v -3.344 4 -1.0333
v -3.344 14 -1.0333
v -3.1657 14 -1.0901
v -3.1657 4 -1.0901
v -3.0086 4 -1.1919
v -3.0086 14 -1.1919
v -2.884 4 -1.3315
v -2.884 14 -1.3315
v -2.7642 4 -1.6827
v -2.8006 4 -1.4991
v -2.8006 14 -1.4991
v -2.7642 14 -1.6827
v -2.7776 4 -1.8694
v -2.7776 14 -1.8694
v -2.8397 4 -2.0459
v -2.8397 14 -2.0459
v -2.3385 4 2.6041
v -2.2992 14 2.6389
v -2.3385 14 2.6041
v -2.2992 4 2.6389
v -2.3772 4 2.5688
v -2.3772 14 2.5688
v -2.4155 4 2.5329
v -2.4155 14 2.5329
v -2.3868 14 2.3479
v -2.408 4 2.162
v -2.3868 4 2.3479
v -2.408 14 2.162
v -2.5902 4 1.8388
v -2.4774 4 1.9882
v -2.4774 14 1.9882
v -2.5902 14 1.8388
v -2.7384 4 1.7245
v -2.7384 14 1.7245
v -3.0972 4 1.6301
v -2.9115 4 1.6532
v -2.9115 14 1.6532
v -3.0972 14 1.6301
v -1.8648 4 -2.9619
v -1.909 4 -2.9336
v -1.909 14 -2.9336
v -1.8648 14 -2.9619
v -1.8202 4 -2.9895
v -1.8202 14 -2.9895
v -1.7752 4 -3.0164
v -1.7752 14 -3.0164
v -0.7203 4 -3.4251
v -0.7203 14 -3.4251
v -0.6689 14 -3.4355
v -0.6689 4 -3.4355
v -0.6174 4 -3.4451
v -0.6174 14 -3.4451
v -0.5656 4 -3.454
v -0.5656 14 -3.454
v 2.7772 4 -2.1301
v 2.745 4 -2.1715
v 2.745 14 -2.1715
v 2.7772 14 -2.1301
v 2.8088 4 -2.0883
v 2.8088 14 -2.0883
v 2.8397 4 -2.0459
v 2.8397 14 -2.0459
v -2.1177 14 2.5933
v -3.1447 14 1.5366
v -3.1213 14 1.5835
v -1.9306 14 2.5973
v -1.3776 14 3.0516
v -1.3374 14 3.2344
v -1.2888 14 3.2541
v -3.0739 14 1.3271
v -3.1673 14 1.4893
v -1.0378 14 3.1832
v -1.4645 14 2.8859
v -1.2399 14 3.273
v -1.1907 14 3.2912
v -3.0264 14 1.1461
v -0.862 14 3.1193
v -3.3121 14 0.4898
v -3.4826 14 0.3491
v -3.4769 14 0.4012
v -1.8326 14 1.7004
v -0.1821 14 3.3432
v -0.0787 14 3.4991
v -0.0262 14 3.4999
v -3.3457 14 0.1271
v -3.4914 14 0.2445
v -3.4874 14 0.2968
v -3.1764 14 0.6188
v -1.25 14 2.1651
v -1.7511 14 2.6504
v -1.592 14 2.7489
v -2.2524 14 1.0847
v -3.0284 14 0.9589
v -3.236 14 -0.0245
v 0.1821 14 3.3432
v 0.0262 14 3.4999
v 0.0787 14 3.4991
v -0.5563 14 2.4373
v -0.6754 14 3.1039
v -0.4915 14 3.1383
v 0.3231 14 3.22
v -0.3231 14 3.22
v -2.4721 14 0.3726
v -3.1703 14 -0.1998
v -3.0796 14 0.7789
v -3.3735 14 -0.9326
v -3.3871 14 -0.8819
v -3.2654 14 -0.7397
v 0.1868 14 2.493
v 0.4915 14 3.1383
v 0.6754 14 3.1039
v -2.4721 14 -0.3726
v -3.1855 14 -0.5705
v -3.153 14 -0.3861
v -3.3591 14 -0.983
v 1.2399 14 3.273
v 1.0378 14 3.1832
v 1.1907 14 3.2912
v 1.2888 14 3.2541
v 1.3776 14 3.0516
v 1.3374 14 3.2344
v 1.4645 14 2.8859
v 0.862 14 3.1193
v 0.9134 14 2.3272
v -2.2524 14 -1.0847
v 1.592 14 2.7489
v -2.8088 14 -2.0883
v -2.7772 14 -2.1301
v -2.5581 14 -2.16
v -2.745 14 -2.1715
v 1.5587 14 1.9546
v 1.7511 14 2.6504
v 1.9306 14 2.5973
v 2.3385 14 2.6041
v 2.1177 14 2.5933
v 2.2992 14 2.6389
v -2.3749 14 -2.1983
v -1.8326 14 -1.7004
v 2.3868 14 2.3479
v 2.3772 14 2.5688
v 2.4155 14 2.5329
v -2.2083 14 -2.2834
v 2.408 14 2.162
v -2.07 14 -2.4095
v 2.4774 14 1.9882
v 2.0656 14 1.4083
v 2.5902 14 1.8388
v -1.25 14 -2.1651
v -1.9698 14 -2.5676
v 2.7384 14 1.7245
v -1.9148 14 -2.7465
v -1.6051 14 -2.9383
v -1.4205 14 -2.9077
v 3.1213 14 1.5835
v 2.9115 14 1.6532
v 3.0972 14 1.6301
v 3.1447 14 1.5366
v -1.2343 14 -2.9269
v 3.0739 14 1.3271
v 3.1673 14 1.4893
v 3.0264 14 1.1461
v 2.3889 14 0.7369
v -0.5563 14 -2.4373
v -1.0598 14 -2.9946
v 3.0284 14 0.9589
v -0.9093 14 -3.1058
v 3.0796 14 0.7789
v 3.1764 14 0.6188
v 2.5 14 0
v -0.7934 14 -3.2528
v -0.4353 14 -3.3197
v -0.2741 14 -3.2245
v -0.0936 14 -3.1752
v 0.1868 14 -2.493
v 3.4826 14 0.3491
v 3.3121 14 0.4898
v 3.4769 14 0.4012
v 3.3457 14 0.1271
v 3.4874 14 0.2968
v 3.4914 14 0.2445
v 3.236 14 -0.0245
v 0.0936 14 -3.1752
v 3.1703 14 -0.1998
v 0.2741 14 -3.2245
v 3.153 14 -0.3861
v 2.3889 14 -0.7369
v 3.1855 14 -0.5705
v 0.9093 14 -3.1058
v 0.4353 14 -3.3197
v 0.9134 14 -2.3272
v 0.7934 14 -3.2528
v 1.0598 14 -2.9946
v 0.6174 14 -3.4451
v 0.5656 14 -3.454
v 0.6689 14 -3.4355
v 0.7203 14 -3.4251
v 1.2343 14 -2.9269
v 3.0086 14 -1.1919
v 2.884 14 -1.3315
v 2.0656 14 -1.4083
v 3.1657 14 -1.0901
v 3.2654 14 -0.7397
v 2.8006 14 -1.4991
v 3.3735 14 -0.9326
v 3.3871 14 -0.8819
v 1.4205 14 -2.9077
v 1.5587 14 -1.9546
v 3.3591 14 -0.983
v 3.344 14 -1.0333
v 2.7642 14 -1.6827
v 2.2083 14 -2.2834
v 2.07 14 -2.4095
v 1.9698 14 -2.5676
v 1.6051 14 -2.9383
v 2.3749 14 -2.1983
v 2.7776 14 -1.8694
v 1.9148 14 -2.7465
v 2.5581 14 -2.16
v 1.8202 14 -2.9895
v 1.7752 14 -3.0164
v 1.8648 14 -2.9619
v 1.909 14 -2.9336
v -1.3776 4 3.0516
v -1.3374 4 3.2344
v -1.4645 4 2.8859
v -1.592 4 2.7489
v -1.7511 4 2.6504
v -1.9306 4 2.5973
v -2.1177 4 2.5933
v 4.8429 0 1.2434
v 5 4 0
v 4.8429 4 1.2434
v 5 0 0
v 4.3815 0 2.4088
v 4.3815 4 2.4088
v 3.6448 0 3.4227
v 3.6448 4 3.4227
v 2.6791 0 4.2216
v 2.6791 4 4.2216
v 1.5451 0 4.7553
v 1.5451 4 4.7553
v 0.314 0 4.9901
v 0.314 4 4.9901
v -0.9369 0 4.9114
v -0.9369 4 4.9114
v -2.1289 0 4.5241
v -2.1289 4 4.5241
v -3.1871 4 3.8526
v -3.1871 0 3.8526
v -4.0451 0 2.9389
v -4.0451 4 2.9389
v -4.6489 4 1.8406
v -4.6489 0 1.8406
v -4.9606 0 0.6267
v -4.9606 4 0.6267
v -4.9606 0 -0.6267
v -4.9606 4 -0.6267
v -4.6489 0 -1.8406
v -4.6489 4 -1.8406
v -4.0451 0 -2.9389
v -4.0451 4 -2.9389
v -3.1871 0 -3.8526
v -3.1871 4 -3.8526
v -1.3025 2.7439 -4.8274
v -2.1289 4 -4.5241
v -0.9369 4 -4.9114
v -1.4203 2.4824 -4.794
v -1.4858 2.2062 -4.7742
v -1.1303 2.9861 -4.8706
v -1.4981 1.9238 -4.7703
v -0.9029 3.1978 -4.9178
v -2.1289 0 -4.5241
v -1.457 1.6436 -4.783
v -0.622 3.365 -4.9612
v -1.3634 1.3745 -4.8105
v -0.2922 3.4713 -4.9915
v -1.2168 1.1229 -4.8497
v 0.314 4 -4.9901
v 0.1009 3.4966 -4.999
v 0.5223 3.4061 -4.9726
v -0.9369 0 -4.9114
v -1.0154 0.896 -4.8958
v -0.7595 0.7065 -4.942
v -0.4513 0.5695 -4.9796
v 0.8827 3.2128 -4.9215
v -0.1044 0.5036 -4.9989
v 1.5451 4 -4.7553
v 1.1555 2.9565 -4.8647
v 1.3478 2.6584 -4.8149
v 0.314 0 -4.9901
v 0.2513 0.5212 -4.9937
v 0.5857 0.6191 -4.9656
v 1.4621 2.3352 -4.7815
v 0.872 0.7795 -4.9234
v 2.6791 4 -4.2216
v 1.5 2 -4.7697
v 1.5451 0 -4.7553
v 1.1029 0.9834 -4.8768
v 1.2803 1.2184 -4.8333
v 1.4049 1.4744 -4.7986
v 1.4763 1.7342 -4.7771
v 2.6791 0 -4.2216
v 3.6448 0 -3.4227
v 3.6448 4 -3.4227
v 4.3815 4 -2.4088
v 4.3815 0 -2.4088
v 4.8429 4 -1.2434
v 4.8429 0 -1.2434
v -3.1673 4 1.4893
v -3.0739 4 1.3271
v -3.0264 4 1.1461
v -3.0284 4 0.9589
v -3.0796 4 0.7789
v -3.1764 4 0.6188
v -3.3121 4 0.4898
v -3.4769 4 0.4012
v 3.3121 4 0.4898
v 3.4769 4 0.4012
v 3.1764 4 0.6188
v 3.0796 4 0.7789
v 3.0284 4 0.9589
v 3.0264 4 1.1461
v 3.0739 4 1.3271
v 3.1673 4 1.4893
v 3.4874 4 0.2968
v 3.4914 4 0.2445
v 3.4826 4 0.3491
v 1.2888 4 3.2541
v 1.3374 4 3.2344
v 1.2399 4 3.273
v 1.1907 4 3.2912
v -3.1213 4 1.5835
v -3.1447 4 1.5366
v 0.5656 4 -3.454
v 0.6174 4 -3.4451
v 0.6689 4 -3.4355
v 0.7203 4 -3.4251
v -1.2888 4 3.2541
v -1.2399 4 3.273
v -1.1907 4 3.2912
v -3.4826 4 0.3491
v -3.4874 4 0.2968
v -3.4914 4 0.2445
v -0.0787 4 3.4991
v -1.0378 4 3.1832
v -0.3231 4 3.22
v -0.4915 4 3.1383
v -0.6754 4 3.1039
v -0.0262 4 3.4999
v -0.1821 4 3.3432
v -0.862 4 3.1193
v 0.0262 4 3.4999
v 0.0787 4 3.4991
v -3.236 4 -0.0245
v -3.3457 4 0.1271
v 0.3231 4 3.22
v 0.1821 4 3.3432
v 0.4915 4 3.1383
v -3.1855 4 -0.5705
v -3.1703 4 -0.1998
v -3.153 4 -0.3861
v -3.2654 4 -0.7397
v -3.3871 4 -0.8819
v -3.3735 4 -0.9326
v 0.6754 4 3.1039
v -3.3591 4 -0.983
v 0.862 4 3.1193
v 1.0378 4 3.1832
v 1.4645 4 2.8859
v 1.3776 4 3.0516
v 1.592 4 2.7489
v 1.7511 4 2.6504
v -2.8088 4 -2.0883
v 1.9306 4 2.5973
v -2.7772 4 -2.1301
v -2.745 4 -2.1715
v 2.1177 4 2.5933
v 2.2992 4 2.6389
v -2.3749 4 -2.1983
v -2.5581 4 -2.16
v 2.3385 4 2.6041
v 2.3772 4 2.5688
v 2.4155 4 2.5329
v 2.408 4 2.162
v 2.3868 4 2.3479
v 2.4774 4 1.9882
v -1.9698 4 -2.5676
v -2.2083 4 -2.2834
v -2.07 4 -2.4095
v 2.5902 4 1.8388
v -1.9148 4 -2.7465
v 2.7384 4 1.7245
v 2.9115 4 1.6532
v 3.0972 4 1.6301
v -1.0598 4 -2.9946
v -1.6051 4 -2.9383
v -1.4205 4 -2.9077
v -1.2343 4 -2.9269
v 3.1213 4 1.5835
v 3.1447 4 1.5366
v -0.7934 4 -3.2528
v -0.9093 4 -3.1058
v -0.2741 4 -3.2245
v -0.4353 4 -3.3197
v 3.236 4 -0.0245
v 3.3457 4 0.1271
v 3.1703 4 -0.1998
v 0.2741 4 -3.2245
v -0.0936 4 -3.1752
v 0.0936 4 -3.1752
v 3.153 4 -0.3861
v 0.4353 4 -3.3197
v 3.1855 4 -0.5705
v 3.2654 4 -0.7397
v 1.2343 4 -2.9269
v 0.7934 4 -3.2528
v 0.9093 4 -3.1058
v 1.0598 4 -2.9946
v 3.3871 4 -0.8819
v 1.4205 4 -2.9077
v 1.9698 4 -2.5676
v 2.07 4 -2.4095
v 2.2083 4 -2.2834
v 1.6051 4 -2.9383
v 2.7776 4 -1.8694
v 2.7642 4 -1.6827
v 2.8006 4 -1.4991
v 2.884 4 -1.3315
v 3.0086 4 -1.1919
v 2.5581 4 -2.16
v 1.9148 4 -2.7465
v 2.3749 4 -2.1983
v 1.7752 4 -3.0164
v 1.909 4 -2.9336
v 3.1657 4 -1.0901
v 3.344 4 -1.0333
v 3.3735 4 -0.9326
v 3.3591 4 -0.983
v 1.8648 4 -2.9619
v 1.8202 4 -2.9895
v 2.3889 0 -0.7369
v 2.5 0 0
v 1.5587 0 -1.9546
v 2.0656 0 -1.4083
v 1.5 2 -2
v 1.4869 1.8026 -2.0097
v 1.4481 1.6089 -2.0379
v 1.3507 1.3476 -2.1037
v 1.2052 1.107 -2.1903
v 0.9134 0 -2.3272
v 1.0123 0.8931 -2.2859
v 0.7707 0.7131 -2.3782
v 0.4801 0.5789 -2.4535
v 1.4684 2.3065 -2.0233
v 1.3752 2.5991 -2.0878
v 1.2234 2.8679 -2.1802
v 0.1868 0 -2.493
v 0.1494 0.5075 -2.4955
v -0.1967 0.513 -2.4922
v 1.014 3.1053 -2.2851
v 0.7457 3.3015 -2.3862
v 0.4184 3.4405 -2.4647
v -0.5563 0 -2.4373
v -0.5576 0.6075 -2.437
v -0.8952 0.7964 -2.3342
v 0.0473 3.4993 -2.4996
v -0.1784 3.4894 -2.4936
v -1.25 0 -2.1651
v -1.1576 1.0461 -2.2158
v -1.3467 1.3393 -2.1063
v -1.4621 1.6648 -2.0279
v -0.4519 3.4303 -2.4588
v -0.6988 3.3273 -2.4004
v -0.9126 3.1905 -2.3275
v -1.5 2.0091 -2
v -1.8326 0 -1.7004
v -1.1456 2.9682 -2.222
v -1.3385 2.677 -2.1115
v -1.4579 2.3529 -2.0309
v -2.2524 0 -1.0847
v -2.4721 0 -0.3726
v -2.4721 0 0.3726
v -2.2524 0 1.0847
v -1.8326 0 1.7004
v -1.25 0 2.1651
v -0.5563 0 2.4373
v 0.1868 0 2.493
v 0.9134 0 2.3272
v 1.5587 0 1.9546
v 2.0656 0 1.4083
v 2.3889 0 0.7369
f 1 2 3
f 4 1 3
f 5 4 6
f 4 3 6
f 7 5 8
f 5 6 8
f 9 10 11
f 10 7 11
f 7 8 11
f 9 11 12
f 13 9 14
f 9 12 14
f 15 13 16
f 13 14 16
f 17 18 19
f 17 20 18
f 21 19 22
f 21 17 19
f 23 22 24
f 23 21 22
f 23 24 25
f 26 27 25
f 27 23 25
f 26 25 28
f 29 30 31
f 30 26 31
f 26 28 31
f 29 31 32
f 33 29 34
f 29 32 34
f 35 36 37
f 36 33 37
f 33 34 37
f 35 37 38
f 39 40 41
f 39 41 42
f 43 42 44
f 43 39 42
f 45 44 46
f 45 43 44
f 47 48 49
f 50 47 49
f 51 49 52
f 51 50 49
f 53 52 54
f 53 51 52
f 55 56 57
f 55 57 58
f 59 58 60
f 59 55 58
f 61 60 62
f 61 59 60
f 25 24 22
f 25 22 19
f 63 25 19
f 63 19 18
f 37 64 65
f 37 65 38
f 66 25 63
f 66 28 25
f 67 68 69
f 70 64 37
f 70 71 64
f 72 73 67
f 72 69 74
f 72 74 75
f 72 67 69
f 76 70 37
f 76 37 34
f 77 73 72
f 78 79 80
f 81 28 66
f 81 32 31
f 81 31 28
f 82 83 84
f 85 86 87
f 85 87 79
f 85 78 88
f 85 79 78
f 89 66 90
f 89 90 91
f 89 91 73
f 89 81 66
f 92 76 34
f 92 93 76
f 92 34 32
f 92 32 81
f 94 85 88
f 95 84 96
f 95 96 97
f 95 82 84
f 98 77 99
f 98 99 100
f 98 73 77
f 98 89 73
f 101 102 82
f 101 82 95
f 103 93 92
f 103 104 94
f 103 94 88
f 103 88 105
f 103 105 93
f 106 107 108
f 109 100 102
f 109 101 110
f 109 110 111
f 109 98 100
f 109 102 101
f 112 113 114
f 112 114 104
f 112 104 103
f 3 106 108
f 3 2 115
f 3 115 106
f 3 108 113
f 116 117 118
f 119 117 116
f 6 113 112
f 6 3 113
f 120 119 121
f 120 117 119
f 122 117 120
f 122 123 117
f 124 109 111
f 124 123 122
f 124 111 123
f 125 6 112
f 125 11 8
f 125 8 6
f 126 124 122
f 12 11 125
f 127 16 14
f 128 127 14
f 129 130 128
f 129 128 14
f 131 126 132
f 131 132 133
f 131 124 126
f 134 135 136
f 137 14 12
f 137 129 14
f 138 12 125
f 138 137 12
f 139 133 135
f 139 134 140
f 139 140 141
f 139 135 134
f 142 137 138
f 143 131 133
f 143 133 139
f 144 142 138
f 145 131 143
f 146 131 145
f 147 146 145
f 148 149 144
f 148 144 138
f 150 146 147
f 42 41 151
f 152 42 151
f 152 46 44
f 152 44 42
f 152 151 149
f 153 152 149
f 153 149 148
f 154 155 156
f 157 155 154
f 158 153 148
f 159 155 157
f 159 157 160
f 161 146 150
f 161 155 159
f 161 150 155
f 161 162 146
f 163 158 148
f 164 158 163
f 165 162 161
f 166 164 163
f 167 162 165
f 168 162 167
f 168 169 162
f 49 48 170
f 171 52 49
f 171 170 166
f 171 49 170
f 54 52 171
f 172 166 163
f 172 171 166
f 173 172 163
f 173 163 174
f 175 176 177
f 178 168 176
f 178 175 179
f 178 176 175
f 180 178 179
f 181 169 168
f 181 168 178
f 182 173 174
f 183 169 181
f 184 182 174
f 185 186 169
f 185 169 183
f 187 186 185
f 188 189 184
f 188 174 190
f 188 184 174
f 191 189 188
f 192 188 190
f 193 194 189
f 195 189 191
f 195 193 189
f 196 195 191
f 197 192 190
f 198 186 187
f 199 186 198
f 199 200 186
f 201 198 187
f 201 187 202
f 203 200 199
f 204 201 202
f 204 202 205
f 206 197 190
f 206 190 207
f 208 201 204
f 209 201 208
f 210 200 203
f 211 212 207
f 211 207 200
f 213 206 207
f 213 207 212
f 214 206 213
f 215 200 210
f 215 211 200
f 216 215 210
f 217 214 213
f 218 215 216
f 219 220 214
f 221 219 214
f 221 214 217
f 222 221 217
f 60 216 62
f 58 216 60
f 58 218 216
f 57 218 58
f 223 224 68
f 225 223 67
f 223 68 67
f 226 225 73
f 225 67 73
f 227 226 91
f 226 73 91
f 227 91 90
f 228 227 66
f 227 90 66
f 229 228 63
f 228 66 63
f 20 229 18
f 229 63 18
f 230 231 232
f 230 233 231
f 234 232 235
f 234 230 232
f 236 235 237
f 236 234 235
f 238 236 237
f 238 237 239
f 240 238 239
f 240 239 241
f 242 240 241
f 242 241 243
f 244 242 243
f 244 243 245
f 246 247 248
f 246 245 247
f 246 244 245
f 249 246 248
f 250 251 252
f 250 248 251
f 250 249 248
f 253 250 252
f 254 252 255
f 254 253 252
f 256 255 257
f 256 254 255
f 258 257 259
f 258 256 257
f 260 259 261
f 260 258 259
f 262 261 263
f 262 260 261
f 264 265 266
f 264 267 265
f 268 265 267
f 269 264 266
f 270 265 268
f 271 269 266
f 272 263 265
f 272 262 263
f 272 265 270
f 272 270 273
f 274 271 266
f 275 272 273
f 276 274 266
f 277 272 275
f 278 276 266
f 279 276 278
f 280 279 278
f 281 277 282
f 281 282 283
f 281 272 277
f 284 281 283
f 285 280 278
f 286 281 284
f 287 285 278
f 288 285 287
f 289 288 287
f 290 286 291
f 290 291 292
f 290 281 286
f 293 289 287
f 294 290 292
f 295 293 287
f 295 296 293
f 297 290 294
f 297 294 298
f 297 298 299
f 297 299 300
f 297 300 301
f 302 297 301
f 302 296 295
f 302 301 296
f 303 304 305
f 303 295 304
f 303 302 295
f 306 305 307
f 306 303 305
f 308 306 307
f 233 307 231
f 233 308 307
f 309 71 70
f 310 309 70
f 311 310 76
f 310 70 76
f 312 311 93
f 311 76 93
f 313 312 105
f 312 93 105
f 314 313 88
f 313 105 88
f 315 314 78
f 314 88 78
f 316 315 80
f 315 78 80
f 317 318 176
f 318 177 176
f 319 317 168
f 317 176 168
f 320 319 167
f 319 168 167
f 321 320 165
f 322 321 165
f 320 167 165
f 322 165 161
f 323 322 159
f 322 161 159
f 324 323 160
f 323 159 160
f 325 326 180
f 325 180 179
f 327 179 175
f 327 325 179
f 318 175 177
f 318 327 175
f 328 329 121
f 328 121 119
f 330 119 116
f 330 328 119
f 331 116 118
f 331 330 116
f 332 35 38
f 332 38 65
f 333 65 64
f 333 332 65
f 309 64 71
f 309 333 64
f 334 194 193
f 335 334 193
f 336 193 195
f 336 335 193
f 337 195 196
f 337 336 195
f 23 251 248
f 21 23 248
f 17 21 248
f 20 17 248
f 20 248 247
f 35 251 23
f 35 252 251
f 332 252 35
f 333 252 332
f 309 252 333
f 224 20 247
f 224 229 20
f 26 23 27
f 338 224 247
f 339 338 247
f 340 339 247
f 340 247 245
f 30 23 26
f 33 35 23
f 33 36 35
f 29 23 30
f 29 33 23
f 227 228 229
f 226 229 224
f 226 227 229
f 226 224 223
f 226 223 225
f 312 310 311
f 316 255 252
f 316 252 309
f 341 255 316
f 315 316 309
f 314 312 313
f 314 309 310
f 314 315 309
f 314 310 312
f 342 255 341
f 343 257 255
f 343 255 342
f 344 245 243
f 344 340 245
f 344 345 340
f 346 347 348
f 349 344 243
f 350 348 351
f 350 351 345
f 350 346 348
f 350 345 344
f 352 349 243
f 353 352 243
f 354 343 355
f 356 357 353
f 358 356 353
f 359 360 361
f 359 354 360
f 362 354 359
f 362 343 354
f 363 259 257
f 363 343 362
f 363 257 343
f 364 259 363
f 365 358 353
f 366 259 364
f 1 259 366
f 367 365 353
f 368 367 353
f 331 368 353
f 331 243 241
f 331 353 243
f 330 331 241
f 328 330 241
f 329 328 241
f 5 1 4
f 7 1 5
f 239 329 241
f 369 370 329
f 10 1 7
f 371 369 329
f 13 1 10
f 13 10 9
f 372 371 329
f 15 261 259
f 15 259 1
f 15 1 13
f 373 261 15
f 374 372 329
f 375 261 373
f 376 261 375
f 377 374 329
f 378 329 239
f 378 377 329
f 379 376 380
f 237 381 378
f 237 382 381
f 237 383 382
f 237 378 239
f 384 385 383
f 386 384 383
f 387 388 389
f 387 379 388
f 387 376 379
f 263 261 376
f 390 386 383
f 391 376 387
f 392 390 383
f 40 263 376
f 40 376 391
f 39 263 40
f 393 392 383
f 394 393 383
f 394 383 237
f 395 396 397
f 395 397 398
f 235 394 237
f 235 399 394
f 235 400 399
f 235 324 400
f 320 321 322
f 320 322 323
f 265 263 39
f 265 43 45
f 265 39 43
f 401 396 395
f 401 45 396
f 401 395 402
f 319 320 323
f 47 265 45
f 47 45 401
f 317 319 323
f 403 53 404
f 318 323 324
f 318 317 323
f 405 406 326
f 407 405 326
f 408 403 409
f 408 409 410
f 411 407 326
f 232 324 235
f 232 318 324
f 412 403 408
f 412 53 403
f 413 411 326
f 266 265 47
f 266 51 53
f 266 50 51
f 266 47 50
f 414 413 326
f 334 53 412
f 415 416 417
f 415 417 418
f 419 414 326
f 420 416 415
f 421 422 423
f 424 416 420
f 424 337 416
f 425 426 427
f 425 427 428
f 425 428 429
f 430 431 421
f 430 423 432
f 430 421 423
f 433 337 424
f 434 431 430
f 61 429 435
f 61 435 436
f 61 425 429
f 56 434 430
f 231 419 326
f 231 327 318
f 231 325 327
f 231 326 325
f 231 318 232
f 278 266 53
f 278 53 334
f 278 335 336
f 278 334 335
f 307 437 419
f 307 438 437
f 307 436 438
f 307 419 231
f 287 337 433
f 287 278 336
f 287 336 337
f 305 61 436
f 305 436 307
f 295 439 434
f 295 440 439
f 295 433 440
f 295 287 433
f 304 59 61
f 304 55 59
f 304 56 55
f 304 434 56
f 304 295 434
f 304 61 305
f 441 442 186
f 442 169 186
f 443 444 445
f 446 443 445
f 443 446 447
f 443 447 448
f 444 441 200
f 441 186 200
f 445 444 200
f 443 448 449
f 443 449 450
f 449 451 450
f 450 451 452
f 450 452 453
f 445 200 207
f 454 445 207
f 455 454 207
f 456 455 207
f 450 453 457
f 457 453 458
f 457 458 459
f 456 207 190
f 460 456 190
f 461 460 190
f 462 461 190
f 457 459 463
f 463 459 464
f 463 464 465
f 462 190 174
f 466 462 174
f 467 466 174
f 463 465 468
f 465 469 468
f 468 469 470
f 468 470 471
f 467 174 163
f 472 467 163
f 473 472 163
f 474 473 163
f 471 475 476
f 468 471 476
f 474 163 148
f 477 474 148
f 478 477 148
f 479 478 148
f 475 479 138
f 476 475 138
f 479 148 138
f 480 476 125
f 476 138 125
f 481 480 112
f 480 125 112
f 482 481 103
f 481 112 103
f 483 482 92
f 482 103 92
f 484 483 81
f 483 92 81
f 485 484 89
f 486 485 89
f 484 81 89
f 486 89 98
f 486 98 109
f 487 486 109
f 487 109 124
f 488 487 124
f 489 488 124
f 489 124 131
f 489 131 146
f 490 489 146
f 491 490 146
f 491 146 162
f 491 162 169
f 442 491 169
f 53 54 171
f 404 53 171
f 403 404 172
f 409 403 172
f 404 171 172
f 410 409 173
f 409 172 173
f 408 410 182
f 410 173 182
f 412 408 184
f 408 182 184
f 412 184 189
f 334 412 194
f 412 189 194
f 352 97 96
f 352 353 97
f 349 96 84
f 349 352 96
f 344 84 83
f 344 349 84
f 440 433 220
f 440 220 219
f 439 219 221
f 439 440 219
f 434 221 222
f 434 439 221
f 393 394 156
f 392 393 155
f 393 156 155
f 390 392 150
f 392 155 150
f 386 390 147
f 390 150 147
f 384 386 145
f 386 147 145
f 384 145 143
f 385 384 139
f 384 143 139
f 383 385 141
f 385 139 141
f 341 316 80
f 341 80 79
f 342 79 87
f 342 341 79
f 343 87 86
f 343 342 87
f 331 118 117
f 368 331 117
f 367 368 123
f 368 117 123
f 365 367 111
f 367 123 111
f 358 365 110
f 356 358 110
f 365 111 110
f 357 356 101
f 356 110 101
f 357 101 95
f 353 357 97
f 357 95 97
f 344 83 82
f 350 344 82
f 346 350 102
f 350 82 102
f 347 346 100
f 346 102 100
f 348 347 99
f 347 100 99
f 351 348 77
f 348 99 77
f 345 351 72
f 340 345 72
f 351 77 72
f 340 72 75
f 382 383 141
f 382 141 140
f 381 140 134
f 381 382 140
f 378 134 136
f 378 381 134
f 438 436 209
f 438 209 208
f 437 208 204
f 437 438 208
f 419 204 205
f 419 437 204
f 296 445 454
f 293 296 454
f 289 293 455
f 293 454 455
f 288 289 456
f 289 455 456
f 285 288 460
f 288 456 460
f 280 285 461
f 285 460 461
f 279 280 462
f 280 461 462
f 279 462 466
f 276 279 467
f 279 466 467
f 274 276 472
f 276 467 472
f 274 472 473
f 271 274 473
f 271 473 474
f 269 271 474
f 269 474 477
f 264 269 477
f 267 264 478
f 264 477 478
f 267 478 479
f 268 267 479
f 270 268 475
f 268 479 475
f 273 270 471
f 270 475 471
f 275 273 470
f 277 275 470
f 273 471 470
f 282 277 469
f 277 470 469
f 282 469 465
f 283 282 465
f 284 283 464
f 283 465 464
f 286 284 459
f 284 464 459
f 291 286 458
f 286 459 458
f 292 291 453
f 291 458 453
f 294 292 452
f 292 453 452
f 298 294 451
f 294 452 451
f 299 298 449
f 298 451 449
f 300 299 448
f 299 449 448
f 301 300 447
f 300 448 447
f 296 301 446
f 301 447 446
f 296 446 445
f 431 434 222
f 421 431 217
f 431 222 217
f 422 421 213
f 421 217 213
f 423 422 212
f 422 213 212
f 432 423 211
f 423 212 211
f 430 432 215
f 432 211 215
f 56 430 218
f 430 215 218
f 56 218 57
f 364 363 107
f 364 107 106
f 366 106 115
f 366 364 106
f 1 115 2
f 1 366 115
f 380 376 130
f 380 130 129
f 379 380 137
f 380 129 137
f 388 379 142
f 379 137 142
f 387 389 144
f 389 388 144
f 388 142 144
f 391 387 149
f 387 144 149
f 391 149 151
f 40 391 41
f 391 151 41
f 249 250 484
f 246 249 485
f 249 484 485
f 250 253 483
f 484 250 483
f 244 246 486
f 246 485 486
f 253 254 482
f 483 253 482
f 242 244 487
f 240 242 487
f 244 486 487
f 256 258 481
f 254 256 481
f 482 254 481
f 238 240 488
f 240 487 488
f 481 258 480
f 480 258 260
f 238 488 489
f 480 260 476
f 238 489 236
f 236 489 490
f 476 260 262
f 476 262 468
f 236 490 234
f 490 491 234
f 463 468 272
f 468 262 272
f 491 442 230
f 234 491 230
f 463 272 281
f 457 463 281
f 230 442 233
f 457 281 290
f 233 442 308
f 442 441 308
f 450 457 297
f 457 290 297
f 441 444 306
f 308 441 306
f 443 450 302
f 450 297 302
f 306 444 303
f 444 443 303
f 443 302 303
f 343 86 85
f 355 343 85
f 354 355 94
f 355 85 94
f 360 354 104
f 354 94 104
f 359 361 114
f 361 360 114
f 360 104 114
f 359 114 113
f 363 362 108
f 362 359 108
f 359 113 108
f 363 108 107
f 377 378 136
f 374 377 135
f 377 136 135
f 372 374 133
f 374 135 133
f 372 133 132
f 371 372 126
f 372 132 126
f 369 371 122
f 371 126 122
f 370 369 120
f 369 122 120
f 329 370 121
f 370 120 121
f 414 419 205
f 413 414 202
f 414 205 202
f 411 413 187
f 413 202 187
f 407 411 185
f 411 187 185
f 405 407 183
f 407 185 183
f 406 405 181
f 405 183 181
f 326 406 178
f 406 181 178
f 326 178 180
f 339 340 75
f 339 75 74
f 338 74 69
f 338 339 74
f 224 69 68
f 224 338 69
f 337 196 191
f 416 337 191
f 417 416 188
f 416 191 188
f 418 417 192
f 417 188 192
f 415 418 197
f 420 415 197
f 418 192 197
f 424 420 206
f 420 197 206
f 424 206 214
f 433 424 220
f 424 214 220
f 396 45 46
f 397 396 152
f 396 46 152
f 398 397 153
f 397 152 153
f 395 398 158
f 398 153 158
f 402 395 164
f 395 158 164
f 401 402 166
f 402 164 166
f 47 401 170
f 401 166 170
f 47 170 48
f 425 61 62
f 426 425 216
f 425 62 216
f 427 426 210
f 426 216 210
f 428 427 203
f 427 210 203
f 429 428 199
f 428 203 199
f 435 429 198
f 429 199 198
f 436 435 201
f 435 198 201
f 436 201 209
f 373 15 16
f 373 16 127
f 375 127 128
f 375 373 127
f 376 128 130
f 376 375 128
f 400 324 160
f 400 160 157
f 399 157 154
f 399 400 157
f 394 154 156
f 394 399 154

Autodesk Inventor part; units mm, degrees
ref_plane "YZ Plane" through (0, 0, 0) normal (1, 0, 0) x (0, 1, 0)
ref_plane "XZ Plane" through (0, 0, 0) normal (0, 1, 0) x (-1, 0, 0)
ref_plane "XY Plane" through (0, 0, 0) normal (0, 0, 1) x (1, 0, 0)
sketch "Sketch1" plane through (0, 0, 0) normal (0, 0, 1) x (1, 0, 0)
  line L0 (0, 0.8293) -> (0, 13.3857)
  line L1 (2.5, 0) -> (2.5, 14)
  line L2 (2.5, 14) -> (3.5, 14)
  line L3 (3.5, 14) -> (3.5, 4)
  line L4 (3.5, 4) -> (5, 4)
  line L5 (5, 4) -> (5, 0)
  line L6 (5, 0) -> (2.5, 0)
  point P0 (0, 0)
  dimension "d0" = 2.5
  dimension "d2" = 3.5
  dimension "d3" = 10
  dimension "d4" = 4
  dimension "d5" = 5
revolve "Revolution1" add sketch "Sketch1" angle 360 about axis through (0, 0.8293, 0) along (0, 1, 0)
sketch "Sketch2" plane through (0, 0, 0) normal (0, 0, 1) x (1, 0, 0)
  circle A0 centre (0, 2) radius 1.5
  point P0 (0, 0)
  dimension "d7" = 2
  dimension "d8" = 3
extrude "Extrusion1" cut sketch "Sketch2" against normal blind 10
thread "Thread1" size "M3x0.5" class "6H" standard "ANSI Metric M Profile" full length
sketch "Sketch3" plane through (0, 14, 0) normal (0, 1, 0) x (1, 0, 0)
  circle A0 centre (0, 0) radius 3.5 projected
  circle A1 centre (0, 3.8726) radius 0.7037
  circle A2 centre (-1.399, 3.6111) radius 0.7037
  circle A3 centre (-2.609, 2.8619) radius 0.7037
  circle A4 centre (-3.4666, 1.7262) radius 0.7037
  circle A5 centre (-3.8561, 0.3573) radius 0.7037
  circle A6 centre (-3.7248, -1.0598) radius 0.7037
  circle A7 centre (-3.0904, -2.3338) radius 0.7037
  circle A8 centre (-2.0387, -3.2926) radius 0.7037
  circle A9 centre (-0.7116, -3.8067) radius 0.7037
  circle A10 centre (0.7116, -3.8067) radius 0.7037
  circle A11 centre (2.0387, -3.2926) radius 0.7037
  circle A12 centre (3.0904, -2.3338) radius 0.7037
  circle A13 centre (3.7248, -1.0598) radius 0.7037
  circle A14 centre (3.8561, 0.3573) radius 0.7037
  circle A15 centre (3.4666, 1.7262) radius 0.7037
  circle A16 centre (2.609, 2.8619) radius 0.7037
  circle A17 centre (1.399, 3.6111) radius 0.7037
  dimension "d15" = 360
extrude "Extrusion2" cut sketch "Sketch3" against normal blind 10 contours A0 A14 | A0 A14 | A15 A0 | A0 A15 | A13 A0 | A0 A13 | A16 A0 | A0 A16 | A12 A0 | A0 A12 | A17 A0 | A0 A17 | A11 A0 | A0 A11 | A1 A0 | A0 A1 | A10 A0 | A0 A10 | A2 A0 | A0 A2 | A9 A0 | A0 A9 | A3 A0 | A0 A3 | A8 A0 | A0 A8 | A4 A0 | A0 A4 | A7 A0 | A0 A7 | A5 A0 | A0 A5 | A6 A0 | A0 A6
properties part number "exBolt"
